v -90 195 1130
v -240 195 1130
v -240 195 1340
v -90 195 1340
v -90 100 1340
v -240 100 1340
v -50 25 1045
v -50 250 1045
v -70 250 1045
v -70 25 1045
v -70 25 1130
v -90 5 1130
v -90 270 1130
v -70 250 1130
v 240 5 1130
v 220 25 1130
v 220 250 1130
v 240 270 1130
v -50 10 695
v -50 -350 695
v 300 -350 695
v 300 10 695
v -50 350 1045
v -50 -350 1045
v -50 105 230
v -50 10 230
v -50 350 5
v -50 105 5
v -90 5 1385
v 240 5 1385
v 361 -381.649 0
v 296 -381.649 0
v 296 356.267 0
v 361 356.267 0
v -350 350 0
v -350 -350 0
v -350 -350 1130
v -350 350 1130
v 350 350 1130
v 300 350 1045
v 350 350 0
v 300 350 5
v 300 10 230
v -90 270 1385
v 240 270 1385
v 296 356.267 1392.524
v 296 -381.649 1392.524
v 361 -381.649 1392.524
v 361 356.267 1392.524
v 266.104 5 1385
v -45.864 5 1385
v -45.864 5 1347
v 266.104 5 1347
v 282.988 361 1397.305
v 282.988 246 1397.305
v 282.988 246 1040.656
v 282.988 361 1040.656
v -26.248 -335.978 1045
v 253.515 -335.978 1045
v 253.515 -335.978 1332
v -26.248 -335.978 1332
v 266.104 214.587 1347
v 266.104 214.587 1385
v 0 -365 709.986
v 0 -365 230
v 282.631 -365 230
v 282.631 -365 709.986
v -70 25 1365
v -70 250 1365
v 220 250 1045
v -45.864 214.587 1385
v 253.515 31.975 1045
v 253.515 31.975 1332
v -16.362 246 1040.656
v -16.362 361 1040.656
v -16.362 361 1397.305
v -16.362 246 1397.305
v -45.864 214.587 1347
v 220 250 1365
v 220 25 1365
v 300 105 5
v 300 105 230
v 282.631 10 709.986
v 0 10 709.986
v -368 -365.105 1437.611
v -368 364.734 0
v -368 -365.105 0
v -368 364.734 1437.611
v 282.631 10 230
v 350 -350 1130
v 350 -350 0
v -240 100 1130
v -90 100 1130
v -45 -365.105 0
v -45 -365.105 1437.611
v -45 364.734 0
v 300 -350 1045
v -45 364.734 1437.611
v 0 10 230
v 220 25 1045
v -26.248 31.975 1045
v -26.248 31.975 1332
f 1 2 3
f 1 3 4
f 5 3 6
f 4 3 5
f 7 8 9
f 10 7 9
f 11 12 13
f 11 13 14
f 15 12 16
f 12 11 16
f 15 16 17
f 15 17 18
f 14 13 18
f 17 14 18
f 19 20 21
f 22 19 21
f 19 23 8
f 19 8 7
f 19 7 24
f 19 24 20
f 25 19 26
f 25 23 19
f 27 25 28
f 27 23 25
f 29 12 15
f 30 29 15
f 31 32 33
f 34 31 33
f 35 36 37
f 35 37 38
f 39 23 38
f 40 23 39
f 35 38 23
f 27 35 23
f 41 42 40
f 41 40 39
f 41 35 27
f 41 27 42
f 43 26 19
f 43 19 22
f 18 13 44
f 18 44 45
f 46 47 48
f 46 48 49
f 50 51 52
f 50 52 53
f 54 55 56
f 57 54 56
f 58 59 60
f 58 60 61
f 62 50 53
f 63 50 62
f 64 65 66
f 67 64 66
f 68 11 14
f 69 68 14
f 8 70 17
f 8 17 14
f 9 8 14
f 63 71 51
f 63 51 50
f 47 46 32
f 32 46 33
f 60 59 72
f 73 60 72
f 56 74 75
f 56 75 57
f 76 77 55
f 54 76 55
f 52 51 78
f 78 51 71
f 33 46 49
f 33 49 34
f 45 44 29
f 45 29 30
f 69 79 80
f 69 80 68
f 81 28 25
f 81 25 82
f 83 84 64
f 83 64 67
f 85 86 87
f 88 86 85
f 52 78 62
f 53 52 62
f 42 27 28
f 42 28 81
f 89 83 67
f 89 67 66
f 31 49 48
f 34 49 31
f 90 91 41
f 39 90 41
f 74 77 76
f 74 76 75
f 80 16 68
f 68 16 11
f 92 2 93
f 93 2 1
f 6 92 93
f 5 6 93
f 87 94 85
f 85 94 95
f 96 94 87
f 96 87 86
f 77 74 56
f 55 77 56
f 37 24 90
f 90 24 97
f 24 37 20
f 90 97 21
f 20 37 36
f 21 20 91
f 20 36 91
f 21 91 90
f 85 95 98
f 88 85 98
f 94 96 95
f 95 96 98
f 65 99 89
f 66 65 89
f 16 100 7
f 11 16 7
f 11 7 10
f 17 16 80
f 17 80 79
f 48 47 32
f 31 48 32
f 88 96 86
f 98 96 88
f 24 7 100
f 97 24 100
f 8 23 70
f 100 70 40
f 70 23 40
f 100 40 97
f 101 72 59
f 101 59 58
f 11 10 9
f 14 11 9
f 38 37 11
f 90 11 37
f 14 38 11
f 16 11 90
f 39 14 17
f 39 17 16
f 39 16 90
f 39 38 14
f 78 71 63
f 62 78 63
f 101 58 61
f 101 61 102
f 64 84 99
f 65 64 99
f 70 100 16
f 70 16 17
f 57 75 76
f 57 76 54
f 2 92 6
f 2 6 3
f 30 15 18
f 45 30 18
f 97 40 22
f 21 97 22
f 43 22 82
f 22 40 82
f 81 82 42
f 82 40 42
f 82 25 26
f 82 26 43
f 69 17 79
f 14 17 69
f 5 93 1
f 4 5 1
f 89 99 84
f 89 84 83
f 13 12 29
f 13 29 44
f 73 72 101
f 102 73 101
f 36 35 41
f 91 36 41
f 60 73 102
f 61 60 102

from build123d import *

# Parameters (mm, degrees)
SCHIZZO1_W                        = 700
SCHIZZO1_H                        = 700
ESTRUSIONE_ESTRUSIONE1_DEPTH      = 1130
SCHIZZO2_W                        = 330
SCHIZZO2_H                        = 265
ESTRUSIONE_ESTRUSIONE2_DEPTH      = 255
SCHIZZO3_W                        = 150
SCHIZZO3_H                        = 95
ESTRUSIONE_ESTRUSIONE3_DEPTH      = 210
SCHIZZO5_W                        = 350
SCHIZZO5_H                        = 1040
TAGLIO_ESTRUSIONE1_DEPTH          = 245
SCHIZZO7_W                        = 350
SCHIZZO7_H                        = 465
TAGLIO_ESTRUSIONE2_DEPTH          = 95
SCHIZZO8_W                        = 350
SCHIZZO8_H                        = 350
TAGLIO_ESTRUSIONE3_DEPTH          = 458
SCHIZZO9_W                        = 290
SCHIZZO9_H                        = 225
TAGLIO_ESTRUSIONE5_DEPTH          = 320
ESTRUSIONE_ESTRUSIONE5_DEPTH      = 18
ESTRUSIONE_ESTRUSIONE5_DEPTH_BACK = 305
SCHIZZO10_W                       = 1437.610772049
SCHIZZO10_H                       = 729.839733265
ESTRUSIONE_ESTRUSIONE6_DEPTH      = 11
ESTRUSIONE_ESTRUSIONE6_DEPTH_BACK = 54
SCHIZZO11_W                       = 1392.524009873
SCHIZZO11_H                       = 737.915681111
ESTRUSIONE_ESTRUSIONE7_DEPTH      = 11
ESTRUSIONE_ESTRUSIONE7_DEPTH_BACK = 104
SCHIZZO12_W                       = 299.349754516
SCHIZZO12_H                       = 356.648974915
SCHIZZO15_W                       = 311.967933214
SCHIZZO15_H                       = 209.587453761
ESTRUSIONE_ESTRUSIONE9_DEPTH      = 38
SCHIZZO18_W                       = 282.631025558
SCHIZZO18_H                       = 479.986147738
ESTRUSIONE_ESTRUSIONE11_DEPTH     = 375
SCHIZZO19_W                       = 279.763490261
SCHIZZO19_H                       = 367.953434119
ESTRUSIONE_ESTRUSIONE12_DEPTH     = 287


with BuildPart() as part:
    # Schizzo1 → Estrusione-Estrusione1 (new body)
    with BuildSketch(Plane.XY):
        Rectangle(SCHIZZO1_W, SCHIZZO1_H)
    extrude(amount=ESTRUSIONE_ESTRUSIONE1_DEPTH)

    # Schizzo5 → Taglio-Estrusione1 (cut)
    with BuildSketch(Plane(origin=(0, 350, 0), x_dir=(1, 0, 0), z_dir=(0, 1, 0))):
        with Locations((125, -525)):
            Rectangle(SCHIZZO5_W, SCHIZZO5_H)
    extrude(amount=-TAGLIO_ESTRUSIONE1_DEPTH, mode=Mode.SUBTRACT)

    # Schizzo7 → Taglio-Estrusione2 (cut)
    with BuildSketch(Plane(origin=(0, 105, 0), x_dir=(1, 0, 0), z_dir=(0, 1, 0))):
        with Locations((125, -462.5)):
            Rectangle(SCHIZZO7_W, SCHIZZO7_H)
    extrude(amount=-TAGLIO_ESTRUSIONE2_DEPTH, mode=Mode.SUBTRACT)

    # Schizzo8 → Taglio-Estrusione3 (cut)
    with BuildSketch(Plane(origin=(0, 105, 0), x_dir=(1, 0, 0), z_dir=(0, 1, 0))):
        with Locations((125, -870)):
            Rectangle(SCHIZZO8_W, SCHIZZO8_H)
    extrude(amount=-TAGLIO_ESTRUSIONE3_DEPTH, mode=Mode.SUBTRACT)


with BuildPart() as body_2:
    # Schizzo2 → Estrusione-Estrusione2 (new body)
    with BuildSketch(Plane.XY.offset(1130)):
        with Locations((75, 137.5)):
            Rectangle(SCHIZZO2_W, SCHIZZO2_H)
    extrude(amount=ESTRUSIONE_ESTRUSIONE2_DEPTH)


with BuildPart() as body_3:
    # Schizzo3 → Estrusione-Estrusione3 (new body)
    with BuildSketch(Plane.XY.offset(1130)):
        with Locations((-165, 147.5)):
            Rectangle(SCHIZZO3_W, SCHIZZO3_H)
    extrude(amount=ESTRUSIONE_ESTRUSIONE3_DEPTH)


with BuildPart() as taglio_estrusione5_tool:
    # Schizzo9 → Taglio-Estrusione5 (new body)
    with BuildSketch(Plane(origin=(0, 0, 1045), x_dir=(-1, 0, 0), z_dir=(0, 0, -1))):
        with Locations((-75, 137.5)):
            Rectangle(SCHIZZO9_W, SCHIZZO9_H)
    extrude(amount=-TAGLIO_ESTRUSIONE5_DEPTH)


with BuildPart() as part_1:
    add(part.part)

    # Taglio-Estrusione5: cut by taglio_estrusione5_tool
    add(taglio_estrusione5_tool.part, mode=Mode.SUBTRACT)


with BuildPart() as body_2_1:
    add(body_2.part)

    # Taglio-Estrusione5: cut by taglio_estrusione5_tool
    add(taglio_estrusione5_tool.part, mode=Mode.SUBTRACT)


with BuildPart() as body_4:
    # Schizzo10 → Estrusione-Estrusione5 (new, two sides: drawn at the far end of the back side and taken through both)
    with BuildSketch(Plane.ZY.offset(350).offset(-ESTRUSIONE_ESTRUSIONE5_DEPTH_BACK)):
        with Locations((718.805386025, -0.185507772)):
            Rectangle(SCHIZZO10_W, SCHIZZO10_H)
    extrude(amount=ESTRUSIONE_ESTRUSIONE5_DEPTH + ESTRUSIONE_ESTRUSIONE5_DEPTH_BACK)


with BuildPart() as body_5:
    # Schizzo11 → Estrusione-Estrusione6 (new, two sides: drawn at the far end of the back side and taken through both)
    with BuildSketch(Plane(origin=(350, 0, 0), x_dir=(0, 0, -1), z_dir=(1, 0, 0)).offset(-ESTRUSIONE_ESTRUSIONE6_DEPTH_BACK)):
        with Locations((-696.262004937, -12.690818359)):
            Rectangle(SCHIZZO11_W, SCHIZZO11_H)
    extrude(amount=ESTRUSIONE_ESTRUSIONE6_DEPTH + ESTRUSIONE_ESTRUSIONE6_DEPTH_BACK)


with BuildPart() as body_6:
    # Schizzo12 → Estrusione-Estrusione7 (new, two sides: drawn at the far end of the back side and taken through both)
    with BuildSketch(Plane(origin=(0, 350, 0), x_dir=(1, 0, 0), z_dir=(0, 1, 0)).offset(-ESTRUSIONE_ESTRUSIONE7_DEPTH_BACK)):
        with Locations((133.312866105, -1218.98054727)):
            Rectangle(SCHIZZO12_W, SCHIZZO12_H)
    extrude(amount=ESTRUSIONE_ESTRUSIONE7_DEPTH + ESTRUSIONE_ESTRUSIONE7_DEPTH_BACK)


with BuildPart() as body_7:
    # Schizzo15 → Estrusione-Estrusione9 (new body)
    with BuildSketch(Plane.XY.offset(1385)):
        with Locations((110.12024335, 109.793726881)):
            Rectangle(SCHIZZO15_W, SCHIZZO15_H)
    extrude(amount=-ESTRUSIONE_ESTRUSIONE9_DEPTH)


with BuildPart() as body_8:
    # Schizzo18 → Estrusione-Estrusione11 (new body)
    with BuildSketch(Plane(origin=(0, 10, 0), x_dir=(1, 0, 0), z_dir=(0, 1, 0))):
        with Locations((141.315512779, -469.993073869)):
            Rectangle(SCHIZZO18_W, SCHIZZO18_H)
    extrude(amount=-ESTRUSIONE_ESTRUSIONE11_DEPTH)


with BuildPart() as body_9:
    # Schizzo19 → Estrusione-Estrusione12 (new body)
    with BuildSketch(Plane(origin=(0, 0, 1045), x_dir=(-1, 0, 0), z_dir=(0, 0, -1))):
        with Locations((-113.633396128, -152.001509819)):
            Rectangle(SCHIZZO19_W, SCHIZZO19_H)
    extrude(amount=-ESTRUSIONE_ESTRUSIONE12_DEPTH)


solid = Compound([body_3.part, part_1.part, body_2_1.part, body_4.part, body_5.part, body_6.part, body_7.part, body_8.part, body_9.part])
